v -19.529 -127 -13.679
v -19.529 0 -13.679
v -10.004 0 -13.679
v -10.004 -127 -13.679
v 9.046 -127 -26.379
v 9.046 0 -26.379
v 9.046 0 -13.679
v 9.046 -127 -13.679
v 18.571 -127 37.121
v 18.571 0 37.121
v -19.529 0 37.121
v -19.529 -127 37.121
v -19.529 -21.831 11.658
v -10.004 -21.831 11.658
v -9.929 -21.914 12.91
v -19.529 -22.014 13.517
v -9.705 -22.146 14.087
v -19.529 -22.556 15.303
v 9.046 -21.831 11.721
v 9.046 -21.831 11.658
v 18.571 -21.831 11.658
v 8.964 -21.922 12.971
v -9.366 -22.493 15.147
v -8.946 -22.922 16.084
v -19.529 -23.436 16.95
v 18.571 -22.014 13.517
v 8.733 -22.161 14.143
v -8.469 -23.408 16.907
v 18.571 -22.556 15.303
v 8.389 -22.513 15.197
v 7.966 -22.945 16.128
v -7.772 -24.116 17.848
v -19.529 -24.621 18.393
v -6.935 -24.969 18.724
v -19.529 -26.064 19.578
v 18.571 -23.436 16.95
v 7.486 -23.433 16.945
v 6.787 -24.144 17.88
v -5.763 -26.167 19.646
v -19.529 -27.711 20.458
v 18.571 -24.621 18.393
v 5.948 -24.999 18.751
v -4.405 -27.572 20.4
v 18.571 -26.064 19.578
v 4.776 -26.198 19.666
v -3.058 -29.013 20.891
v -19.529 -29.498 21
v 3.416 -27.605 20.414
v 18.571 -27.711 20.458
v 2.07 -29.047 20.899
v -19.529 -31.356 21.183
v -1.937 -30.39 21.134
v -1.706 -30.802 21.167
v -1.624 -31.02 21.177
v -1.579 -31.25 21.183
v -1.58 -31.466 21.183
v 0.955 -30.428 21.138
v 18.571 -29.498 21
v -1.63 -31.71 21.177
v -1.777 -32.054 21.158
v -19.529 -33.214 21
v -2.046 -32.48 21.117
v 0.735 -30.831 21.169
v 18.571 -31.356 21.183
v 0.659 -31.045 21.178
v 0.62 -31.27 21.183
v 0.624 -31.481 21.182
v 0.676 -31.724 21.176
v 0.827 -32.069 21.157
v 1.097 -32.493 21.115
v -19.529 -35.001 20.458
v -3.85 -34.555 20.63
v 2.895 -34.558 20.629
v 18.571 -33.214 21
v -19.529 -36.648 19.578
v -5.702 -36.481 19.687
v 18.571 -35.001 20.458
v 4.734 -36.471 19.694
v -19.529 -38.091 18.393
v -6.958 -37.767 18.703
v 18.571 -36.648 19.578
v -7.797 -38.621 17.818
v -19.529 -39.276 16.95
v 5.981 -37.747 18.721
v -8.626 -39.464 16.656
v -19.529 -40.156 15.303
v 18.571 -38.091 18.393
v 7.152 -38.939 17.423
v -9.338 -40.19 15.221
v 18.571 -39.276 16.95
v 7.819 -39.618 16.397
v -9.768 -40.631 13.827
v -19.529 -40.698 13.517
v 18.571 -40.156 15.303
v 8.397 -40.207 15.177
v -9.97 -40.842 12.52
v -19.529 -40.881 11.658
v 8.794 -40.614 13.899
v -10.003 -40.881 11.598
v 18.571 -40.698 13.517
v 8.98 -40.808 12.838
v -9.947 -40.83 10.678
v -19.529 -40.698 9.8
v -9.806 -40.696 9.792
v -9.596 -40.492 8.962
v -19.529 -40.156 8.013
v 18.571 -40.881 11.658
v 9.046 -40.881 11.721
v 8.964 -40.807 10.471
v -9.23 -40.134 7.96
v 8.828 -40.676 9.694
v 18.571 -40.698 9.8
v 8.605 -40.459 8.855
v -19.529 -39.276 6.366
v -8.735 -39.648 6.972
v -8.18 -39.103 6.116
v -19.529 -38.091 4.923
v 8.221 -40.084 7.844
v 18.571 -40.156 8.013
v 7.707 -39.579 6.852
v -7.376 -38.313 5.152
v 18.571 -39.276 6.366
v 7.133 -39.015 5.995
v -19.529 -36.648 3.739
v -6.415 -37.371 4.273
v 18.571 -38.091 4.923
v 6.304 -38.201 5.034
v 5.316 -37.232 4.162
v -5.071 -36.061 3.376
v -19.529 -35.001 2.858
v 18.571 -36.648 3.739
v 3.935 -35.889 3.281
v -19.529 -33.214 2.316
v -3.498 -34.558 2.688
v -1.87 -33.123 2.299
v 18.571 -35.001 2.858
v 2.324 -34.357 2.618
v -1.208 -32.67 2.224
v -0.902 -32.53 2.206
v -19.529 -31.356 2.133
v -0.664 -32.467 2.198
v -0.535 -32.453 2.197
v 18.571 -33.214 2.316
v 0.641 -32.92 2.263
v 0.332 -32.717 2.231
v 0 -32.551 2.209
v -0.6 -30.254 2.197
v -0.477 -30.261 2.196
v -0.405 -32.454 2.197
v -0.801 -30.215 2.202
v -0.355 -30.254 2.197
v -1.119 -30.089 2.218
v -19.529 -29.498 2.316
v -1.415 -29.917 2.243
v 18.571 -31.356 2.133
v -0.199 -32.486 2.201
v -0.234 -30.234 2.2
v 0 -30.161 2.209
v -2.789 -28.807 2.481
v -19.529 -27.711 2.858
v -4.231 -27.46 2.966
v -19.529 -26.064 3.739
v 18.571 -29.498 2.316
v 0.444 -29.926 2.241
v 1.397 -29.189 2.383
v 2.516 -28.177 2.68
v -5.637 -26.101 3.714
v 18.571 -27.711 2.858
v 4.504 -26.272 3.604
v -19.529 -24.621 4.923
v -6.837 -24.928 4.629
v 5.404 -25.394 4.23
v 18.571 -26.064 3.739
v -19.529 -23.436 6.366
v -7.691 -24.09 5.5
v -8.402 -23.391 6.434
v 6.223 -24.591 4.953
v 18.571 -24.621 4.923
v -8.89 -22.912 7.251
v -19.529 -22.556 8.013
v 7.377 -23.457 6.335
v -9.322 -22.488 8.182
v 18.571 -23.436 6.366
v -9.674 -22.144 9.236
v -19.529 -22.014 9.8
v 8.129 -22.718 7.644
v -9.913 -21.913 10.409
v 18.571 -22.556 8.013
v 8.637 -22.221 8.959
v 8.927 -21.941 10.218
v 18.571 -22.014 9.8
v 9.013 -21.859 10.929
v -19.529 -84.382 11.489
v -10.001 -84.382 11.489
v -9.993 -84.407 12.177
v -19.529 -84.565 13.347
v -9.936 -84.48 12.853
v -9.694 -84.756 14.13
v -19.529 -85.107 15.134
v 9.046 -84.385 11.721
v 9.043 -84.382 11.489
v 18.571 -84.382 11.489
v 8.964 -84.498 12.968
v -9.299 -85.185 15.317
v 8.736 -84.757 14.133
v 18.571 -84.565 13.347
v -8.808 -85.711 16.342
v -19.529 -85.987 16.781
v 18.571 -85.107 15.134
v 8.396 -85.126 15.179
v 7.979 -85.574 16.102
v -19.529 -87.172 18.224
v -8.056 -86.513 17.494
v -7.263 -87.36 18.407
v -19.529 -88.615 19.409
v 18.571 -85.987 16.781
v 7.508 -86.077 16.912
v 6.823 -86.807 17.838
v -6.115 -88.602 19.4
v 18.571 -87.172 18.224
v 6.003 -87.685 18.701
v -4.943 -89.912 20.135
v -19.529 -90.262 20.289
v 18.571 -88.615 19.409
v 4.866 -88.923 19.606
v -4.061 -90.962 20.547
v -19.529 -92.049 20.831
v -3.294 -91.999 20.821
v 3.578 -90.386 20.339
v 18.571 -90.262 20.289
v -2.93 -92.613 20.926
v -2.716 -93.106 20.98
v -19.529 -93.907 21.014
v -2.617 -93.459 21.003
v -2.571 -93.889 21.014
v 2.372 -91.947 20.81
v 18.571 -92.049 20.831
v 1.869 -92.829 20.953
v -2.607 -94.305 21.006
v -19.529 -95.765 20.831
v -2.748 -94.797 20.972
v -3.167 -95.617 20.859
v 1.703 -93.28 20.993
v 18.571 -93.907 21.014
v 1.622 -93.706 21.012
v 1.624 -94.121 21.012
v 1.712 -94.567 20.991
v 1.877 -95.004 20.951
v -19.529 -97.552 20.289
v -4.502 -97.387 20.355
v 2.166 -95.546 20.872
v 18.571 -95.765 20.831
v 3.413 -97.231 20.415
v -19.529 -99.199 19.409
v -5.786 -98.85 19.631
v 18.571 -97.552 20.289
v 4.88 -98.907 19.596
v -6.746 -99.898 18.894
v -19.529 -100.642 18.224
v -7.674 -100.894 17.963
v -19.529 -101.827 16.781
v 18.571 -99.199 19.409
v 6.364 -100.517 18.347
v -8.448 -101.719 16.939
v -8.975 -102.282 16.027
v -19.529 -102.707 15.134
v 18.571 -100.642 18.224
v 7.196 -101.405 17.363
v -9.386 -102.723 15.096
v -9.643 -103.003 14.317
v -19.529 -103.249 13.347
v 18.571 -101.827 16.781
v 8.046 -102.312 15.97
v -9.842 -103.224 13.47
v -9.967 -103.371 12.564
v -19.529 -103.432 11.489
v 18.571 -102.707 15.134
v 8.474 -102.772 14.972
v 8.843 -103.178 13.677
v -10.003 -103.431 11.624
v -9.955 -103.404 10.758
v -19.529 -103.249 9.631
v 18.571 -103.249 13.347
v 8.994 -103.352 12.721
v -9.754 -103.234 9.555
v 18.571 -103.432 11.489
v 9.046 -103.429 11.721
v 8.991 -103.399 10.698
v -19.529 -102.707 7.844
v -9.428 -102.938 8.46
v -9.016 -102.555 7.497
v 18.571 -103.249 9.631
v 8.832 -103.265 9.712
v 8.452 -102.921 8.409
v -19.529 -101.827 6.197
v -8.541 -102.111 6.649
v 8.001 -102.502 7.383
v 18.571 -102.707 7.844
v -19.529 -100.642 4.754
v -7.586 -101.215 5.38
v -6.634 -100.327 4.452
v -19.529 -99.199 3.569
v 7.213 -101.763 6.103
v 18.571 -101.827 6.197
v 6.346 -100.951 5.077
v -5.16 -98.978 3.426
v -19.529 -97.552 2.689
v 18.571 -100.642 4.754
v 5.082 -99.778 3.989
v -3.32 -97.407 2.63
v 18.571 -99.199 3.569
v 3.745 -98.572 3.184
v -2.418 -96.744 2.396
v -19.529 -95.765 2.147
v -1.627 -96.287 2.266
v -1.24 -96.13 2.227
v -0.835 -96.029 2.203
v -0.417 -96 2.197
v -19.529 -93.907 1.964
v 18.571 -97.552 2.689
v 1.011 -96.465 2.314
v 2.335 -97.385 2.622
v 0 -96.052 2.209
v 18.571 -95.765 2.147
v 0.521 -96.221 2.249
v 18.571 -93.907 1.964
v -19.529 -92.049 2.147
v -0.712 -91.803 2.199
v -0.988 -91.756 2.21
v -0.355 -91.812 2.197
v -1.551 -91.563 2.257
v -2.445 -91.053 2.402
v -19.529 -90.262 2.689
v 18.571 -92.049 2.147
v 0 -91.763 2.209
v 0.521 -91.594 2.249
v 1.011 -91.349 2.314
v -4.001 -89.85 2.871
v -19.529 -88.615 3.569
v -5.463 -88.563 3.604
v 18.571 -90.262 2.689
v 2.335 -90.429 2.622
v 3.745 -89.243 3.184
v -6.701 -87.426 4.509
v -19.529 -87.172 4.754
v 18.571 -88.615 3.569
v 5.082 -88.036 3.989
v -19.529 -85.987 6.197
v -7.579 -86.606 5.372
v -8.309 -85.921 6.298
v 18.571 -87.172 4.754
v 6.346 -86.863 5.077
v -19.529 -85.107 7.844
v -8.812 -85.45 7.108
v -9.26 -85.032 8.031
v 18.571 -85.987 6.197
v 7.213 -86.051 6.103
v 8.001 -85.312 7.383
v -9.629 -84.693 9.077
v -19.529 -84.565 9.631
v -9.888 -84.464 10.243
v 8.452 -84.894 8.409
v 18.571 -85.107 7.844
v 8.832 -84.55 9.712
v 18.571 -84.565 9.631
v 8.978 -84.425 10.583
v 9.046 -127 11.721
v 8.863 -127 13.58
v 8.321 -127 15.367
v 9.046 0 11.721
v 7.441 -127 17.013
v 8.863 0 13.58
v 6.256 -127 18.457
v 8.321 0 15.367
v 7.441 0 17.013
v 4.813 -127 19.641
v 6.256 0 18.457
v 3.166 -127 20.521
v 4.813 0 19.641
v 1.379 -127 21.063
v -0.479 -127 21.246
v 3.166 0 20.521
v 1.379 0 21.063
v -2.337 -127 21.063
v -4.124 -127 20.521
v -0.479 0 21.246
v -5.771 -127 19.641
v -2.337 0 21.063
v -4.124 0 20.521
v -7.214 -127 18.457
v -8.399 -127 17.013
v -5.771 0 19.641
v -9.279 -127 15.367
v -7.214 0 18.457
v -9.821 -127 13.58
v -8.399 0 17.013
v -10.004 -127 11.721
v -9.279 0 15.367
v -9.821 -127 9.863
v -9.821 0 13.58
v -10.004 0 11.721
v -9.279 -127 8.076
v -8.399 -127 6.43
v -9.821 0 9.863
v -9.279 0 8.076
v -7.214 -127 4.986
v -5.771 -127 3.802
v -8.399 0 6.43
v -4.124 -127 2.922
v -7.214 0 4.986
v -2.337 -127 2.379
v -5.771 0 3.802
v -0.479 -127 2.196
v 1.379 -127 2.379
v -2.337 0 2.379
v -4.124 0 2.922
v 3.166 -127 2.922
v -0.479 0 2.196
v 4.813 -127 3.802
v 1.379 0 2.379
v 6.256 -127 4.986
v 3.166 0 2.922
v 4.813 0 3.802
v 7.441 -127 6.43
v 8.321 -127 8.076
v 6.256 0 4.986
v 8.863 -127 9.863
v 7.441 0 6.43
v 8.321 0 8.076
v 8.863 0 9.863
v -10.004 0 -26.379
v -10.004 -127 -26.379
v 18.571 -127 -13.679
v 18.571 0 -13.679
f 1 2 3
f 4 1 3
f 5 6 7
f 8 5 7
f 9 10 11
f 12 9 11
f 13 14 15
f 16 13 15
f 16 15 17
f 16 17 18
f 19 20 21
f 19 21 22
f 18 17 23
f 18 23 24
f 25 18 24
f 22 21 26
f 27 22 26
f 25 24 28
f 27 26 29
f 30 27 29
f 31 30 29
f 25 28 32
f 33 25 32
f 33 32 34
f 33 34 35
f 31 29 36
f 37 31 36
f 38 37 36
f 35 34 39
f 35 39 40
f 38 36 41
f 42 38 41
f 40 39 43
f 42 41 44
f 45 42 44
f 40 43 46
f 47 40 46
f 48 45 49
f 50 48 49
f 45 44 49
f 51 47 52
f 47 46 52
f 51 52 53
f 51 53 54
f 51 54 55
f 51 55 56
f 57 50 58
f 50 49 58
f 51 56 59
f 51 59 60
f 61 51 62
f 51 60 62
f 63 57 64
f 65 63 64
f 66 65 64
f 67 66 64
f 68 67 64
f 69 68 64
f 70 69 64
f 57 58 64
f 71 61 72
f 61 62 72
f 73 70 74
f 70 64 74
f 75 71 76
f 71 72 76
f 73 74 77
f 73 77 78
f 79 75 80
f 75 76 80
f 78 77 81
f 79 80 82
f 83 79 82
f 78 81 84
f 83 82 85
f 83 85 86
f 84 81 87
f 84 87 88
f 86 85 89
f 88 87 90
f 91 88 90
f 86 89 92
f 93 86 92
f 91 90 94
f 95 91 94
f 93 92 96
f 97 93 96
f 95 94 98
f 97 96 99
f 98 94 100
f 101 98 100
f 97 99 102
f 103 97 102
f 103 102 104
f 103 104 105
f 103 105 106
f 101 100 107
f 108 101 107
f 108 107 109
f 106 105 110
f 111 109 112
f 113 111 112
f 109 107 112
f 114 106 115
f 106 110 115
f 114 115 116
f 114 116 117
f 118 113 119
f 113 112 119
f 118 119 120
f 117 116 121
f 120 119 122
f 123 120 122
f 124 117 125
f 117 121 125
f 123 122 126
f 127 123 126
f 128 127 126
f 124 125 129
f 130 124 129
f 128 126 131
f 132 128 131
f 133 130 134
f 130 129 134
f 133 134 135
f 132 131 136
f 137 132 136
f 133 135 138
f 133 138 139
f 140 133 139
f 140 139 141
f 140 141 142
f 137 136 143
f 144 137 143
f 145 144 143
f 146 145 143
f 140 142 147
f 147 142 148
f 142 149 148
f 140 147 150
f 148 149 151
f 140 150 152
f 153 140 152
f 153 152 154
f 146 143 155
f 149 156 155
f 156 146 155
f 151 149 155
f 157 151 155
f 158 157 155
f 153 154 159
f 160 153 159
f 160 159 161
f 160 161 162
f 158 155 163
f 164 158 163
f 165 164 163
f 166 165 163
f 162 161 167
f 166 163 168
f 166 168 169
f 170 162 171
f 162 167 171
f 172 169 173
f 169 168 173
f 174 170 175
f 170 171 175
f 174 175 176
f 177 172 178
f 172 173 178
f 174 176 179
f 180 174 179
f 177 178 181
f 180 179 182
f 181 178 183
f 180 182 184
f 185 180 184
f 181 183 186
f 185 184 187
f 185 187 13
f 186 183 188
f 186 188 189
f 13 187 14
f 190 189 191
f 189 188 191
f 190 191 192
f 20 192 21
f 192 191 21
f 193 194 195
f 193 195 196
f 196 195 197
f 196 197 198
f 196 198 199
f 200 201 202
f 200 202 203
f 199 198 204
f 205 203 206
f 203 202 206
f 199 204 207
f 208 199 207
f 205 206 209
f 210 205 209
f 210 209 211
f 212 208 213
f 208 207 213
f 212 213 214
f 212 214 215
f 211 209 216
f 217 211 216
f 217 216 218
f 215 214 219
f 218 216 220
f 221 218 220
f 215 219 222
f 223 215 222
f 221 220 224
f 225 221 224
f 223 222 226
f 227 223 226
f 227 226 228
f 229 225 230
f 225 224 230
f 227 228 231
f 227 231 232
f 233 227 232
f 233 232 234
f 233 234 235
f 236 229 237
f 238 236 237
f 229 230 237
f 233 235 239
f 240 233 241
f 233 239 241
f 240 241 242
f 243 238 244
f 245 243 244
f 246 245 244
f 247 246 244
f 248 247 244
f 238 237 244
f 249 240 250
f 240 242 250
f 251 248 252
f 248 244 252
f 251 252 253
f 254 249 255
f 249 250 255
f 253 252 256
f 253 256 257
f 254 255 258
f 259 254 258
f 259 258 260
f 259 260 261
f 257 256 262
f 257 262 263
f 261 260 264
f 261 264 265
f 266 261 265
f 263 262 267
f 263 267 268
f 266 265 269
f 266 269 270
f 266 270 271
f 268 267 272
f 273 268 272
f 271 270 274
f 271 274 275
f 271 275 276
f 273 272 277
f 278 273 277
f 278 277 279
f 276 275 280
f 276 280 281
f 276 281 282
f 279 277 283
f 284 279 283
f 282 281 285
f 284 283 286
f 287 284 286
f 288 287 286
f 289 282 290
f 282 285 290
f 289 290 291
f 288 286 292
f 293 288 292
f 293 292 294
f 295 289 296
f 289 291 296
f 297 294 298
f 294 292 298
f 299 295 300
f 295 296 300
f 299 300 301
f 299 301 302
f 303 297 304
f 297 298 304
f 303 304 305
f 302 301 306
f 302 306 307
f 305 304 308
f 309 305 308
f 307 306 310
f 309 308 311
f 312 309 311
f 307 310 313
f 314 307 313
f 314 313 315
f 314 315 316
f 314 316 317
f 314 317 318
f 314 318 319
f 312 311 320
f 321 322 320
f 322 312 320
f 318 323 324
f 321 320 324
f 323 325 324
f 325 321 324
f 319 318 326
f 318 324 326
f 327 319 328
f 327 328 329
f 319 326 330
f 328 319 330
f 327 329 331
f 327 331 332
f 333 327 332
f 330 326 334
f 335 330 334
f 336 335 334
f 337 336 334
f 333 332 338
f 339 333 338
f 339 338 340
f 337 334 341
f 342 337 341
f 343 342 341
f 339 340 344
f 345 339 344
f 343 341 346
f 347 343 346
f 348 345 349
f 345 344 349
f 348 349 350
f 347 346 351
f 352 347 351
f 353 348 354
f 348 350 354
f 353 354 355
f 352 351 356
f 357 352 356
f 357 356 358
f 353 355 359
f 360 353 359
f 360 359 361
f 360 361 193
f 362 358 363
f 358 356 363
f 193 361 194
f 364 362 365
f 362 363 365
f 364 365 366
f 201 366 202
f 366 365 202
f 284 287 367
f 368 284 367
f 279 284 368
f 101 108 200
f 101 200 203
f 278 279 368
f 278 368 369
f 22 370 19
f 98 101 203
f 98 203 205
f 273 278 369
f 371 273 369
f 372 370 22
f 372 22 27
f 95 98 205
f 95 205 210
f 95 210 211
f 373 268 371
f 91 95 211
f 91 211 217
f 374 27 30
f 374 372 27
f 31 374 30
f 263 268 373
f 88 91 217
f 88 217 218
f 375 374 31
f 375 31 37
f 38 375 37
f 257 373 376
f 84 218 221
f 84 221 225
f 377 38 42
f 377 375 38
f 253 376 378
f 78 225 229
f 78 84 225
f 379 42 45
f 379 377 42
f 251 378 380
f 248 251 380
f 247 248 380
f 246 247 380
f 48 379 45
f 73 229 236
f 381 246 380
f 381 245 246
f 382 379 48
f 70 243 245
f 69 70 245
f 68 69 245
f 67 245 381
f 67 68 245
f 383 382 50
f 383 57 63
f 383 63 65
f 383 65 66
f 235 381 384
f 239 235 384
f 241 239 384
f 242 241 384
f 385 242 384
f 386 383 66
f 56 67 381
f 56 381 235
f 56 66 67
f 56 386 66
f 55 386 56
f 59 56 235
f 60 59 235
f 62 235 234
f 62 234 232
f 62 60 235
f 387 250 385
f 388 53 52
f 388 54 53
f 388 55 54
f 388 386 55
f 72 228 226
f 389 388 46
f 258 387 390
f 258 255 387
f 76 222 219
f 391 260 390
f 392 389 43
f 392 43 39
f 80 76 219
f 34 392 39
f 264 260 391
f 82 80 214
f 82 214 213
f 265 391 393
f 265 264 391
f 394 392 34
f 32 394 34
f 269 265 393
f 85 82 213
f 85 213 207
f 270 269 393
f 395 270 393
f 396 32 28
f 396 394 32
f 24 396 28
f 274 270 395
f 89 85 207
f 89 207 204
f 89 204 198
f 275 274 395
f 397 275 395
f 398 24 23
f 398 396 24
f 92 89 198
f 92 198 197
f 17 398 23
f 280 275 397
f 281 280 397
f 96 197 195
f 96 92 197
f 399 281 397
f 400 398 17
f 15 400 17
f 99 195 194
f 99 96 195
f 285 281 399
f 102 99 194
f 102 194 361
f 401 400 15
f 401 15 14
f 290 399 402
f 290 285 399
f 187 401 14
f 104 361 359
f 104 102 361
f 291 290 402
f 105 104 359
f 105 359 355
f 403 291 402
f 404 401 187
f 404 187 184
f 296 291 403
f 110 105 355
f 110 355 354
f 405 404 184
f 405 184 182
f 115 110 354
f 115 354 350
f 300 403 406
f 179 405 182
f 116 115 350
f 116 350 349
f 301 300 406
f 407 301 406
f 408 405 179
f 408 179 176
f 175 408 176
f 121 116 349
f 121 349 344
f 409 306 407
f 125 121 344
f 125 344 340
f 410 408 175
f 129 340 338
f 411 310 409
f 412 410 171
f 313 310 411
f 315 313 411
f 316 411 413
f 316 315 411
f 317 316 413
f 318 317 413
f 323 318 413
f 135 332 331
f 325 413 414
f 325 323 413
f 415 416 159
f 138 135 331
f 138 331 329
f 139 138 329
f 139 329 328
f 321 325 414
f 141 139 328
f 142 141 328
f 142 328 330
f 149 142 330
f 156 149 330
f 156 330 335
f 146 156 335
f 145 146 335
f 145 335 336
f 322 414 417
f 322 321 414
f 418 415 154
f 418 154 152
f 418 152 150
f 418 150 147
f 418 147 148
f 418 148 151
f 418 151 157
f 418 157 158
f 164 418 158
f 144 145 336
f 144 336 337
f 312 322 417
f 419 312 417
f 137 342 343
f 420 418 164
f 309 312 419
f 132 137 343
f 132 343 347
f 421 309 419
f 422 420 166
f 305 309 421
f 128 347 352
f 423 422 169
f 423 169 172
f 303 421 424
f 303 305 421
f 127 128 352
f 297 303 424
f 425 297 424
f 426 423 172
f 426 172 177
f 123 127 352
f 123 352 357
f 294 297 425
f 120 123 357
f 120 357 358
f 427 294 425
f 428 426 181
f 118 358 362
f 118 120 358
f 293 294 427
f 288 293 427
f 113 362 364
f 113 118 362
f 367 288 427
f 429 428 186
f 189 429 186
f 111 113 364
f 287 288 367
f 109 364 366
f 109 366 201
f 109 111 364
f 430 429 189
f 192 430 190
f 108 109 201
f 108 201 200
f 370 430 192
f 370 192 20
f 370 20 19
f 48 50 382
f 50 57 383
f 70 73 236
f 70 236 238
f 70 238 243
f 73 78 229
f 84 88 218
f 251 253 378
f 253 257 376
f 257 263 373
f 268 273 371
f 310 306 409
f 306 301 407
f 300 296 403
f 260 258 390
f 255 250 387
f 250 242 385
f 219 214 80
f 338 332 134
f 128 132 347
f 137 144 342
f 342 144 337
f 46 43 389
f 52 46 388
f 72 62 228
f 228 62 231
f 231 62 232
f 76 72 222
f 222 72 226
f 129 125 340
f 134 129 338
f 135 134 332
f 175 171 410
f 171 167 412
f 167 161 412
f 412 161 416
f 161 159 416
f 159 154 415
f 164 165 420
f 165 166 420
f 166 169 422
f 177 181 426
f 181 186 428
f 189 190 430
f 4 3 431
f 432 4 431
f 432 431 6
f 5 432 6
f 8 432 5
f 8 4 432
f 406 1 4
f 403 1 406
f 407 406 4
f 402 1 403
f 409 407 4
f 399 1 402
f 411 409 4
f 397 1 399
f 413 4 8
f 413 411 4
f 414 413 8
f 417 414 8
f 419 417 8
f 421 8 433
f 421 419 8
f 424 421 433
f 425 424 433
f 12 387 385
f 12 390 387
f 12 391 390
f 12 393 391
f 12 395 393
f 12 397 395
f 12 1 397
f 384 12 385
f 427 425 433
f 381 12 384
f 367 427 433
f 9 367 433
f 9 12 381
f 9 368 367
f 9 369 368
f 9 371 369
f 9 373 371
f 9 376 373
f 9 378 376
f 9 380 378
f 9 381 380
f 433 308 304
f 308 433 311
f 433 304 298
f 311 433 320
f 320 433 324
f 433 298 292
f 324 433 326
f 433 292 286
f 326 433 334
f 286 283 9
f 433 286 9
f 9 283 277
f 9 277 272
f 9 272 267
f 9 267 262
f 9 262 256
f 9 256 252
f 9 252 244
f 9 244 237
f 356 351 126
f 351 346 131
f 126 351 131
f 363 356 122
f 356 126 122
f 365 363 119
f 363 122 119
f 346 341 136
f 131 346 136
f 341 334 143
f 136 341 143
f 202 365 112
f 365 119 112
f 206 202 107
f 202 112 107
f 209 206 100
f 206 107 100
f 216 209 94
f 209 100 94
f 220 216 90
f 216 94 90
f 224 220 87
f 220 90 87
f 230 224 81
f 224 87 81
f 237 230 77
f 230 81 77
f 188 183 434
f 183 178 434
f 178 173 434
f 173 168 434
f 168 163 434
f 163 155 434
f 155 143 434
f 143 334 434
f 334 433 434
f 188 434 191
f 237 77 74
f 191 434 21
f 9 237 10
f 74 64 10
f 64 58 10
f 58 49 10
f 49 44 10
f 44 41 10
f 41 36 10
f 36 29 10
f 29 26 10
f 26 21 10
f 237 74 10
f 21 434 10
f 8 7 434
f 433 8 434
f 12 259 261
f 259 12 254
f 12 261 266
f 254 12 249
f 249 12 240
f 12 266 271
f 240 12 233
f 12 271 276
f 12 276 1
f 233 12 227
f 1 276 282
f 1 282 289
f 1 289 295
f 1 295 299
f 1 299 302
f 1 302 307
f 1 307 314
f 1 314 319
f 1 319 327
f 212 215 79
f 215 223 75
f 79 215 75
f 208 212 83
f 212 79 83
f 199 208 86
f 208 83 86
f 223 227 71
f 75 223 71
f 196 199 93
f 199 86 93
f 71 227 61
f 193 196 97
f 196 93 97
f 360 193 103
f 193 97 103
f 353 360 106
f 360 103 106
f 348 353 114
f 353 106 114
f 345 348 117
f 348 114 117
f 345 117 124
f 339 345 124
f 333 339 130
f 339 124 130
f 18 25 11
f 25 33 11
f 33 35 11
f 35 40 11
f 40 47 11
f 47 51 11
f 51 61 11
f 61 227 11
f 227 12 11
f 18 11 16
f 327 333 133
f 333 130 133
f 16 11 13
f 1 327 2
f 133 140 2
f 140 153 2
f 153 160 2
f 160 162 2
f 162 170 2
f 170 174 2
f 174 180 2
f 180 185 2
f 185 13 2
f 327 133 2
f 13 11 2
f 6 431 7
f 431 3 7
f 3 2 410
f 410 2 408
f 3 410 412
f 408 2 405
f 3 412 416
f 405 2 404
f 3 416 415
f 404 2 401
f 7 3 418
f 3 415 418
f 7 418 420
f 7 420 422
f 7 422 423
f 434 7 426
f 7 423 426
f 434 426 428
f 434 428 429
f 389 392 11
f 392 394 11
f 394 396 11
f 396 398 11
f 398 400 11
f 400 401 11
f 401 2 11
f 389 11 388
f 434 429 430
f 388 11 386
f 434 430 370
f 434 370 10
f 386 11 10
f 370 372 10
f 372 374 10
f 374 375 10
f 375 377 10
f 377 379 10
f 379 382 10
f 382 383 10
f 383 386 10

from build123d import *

# Parameters (mm, degrees)
F0_R     = 9.525
F1_DEPTH = 127
F2_R     = 9.525
F3_DEPTH = 34.798
F4_DEPTH = 22.86


with BuildPart() as f1:
    # F0 (on Front) → F1 (new body)
    with BuildSketch(Plane.XZ):
        Polygon((-10.003853, -26.378524), (9.046147, -26.378524), (9.046147, -13.678524), (18.571147, -13.678524), (18.571147, 37.121476), (-19.528853, 37.121476), (-19.528853, -13.678524), (-10.003853, -13.678524), align=None)
        with Locations((-0.478853, 11.721476)):
            Circle(F0_R, mode=Mode.SUBTRACT)
    extrude(amount=F1_DEPTH)

    # F2 (on Right) → F3 (cut)
    with BuildSketch(Plane.YZ):
        with Locations((-93.907245, 11.488916)):
            Circle(F2_R)
        with Locations((-31.356047, 11.658282)):
            Circle(F2_R)
    extrude(amount=-F3_DEPTH, mode=Mode.SUBTRACT)

    # F2 (on Right) → F4 (cut)
    with BuildSketch(Plane.YZ):
        with Locations((-93.907245, 11.488916)):
            Circle(F2_R)
        with Locations((-31.356047, 11.658282)):
            Circle(F2_R)
    extrude(amount=F4_DEPTH, mode=Mode.SUBTRACT)


solid = f1.part
